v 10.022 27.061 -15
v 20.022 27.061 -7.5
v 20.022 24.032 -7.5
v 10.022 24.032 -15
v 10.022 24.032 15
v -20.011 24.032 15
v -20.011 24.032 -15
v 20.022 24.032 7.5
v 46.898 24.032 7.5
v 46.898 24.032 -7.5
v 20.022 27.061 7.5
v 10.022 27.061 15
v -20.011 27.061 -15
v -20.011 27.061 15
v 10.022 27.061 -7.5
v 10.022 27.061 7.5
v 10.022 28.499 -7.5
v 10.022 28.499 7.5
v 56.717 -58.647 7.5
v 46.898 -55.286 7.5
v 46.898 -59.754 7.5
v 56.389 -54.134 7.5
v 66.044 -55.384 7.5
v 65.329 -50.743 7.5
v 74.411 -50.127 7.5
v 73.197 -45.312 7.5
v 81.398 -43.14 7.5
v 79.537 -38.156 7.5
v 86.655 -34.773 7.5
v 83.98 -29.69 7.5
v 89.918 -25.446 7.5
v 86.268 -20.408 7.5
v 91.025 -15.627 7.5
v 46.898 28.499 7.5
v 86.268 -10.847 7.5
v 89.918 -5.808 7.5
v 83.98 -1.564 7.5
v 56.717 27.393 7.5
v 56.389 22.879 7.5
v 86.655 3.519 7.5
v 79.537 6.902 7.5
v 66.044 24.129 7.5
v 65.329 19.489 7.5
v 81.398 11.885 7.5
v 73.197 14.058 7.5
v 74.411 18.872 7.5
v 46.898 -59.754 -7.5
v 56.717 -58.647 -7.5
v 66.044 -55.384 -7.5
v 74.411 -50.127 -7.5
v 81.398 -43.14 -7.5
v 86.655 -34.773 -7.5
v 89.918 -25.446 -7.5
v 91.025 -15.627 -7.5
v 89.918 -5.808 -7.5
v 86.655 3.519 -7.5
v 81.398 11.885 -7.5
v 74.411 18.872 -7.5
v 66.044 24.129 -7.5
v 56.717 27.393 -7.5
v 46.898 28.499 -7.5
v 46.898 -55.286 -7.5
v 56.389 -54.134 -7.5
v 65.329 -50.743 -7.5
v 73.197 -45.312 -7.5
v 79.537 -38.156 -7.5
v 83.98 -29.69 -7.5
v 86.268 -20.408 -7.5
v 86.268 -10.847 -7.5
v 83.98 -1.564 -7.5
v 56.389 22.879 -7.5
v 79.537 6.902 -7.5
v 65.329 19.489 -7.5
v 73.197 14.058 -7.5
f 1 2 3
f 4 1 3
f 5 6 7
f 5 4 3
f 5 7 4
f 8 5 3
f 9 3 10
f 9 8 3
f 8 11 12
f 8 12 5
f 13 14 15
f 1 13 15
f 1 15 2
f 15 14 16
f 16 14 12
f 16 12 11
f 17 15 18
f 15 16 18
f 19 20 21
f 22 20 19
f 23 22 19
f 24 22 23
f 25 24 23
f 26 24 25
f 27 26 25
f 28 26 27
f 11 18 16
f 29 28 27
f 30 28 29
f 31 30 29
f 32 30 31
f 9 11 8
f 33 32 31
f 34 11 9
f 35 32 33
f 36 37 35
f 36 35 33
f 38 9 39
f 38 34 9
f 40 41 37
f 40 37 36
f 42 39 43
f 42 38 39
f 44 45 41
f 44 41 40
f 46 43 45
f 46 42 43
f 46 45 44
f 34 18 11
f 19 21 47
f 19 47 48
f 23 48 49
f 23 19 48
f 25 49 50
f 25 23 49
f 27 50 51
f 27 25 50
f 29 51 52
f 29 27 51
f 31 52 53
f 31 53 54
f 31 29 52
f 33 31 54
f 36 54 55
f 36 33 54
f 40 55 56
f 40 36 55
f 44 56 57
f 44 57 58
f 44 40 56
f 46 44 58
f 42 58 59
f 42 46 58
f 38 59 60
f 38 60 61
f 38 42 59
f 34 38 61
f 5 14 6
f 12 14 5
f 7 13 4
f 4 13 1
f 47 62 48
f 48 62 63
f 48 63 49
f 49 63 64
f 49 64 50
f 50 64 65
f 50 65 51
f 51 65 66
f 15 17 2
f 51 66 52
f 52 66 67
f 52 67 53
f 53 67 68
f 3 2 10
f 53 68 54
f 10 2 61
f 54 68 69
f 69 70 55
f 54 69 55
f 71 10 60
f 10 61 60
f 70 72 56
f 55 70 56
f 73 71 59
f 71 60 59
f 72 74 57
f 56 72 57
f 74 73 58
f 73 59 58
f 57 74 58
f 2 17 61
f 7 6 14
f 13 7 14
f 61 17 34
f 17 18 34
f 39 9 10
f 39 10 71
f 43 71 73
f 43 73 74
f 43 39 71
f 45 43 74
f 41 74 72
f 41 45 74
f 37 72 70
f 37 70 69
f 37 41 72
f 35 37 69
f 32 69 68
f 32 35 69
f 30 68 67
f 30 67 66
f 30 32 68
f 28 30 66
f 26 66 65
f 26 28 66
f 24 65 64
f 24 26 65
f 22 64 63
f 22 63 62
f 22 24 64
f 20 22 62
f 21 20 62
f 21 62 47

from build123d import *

# Parameters (mm, degrees)
F0_W     = 30.0332503393
F0_H     = 3.0297264457
F1_DEPTH = 15
F0_W_2   = 36.8763273582
F0_H_2   = 1.4379325638
F2_DEPTH = 7.5
F3_SIZE2 = 7.49999
F3_SIZE  = 9.99999
F4_SIZE2 = 7.49999
F4_SIZE  = 9.99999


# Not quite as in the source:
# - a fillet or chamfer is up to 0.001 mm smaller than in the source, because OpenCascade refuses the exact size


with BuildPart() as f1:
    # F0 (on Top) → F1 (new body, symmetric)
    with BuildSketch(Plane.XY):
        with Locations((-4.9947178923, 25.5465358496)):
            Rectangle(F0_W, F0_H)
    extrude(amount=F1_DEPTH, both=True)

    # F0 (on Top) → F2 (join, symmetric)
    with BuildSketch(Plane.XY):
        with Locations((-4.9947178923, 25.5465358496)):
            Rectangle(F0_W, F0_H)
        with Locations((28.4600709565, 27.7803653543)):
            Rectangle(F0_W_2, F0_H_2)
        with Locations((28.4600709565, 25.5465358496)):
            Rectangle(F0_W_2, F0_H)
        with BuildLine():
            ThreePointArc((46.8982346356, -58.3157722523), (89.586820298, -15.62718659), (46.8982346356, 27.0613990724))
            Line((46.8982346356, 27.0613990724), (46.8982346356, 24.0316726267))
            ThreePointArc((46.8982346356, 24.0316726267), (86.5570938523, -15.62718659), (46.8982346356, -55.2860458066))
            Line((46.8982346356, -55.2860458066), (46.8982346356, -58.3157722523))
        make_face()
        with BuildLine():
            Line((46.8982346356, 28.4993316362), (46.8982346356, 27.0613990724))
            ThreePointArc((46.8982346356, 27.0613990724), (89.586820298, -15.62718659), (46.8982346356, -58.3157722523))
            Line((46.8982346356, -58.3157722523), (46.8982346356, -59.7537048161))
            ThreePointArc((46.8982346356, -59.7537048161), (91.0247528617, -15.62718659), (46.8982346356, 28.4993316362))
        make_face()
    extrude(amount=F2_DEPTH, both=True)

    # F3 (size 10 and 7.5 in the source; OpenCascade refuses exactly that, so slightly less here)
    f3_edges = [f1.edges().sort_by_distance(p)[0] for p in [
        (10.021907, 25.546536, 7.5),
    ]]
    f3_side = f1.faces().sort_by_distance((11.219825, 27.780365, 7.5))[0]
    chamfer(f3_edges, length=F3_SIZE, length2=F3_SIZE2, reference=f3_side)

    # F4 (size 10 and 7.5 in the source; OpenCascade refuses exactly that, so slightly less here)
    f4_edges = [f1.edges().sort_by_distance(p)[0] for p in [
        (10.021907, 25.546536, -7.5),
    ]]
    f4_side = f1.faces().sort_by_distance((11.219825, 27.780365, -7.5))[0]
    chamfer(f4_edges, length=F4_SIZE, length2=F4_SIZE2, reference=f4_side)


solid = f1.part
